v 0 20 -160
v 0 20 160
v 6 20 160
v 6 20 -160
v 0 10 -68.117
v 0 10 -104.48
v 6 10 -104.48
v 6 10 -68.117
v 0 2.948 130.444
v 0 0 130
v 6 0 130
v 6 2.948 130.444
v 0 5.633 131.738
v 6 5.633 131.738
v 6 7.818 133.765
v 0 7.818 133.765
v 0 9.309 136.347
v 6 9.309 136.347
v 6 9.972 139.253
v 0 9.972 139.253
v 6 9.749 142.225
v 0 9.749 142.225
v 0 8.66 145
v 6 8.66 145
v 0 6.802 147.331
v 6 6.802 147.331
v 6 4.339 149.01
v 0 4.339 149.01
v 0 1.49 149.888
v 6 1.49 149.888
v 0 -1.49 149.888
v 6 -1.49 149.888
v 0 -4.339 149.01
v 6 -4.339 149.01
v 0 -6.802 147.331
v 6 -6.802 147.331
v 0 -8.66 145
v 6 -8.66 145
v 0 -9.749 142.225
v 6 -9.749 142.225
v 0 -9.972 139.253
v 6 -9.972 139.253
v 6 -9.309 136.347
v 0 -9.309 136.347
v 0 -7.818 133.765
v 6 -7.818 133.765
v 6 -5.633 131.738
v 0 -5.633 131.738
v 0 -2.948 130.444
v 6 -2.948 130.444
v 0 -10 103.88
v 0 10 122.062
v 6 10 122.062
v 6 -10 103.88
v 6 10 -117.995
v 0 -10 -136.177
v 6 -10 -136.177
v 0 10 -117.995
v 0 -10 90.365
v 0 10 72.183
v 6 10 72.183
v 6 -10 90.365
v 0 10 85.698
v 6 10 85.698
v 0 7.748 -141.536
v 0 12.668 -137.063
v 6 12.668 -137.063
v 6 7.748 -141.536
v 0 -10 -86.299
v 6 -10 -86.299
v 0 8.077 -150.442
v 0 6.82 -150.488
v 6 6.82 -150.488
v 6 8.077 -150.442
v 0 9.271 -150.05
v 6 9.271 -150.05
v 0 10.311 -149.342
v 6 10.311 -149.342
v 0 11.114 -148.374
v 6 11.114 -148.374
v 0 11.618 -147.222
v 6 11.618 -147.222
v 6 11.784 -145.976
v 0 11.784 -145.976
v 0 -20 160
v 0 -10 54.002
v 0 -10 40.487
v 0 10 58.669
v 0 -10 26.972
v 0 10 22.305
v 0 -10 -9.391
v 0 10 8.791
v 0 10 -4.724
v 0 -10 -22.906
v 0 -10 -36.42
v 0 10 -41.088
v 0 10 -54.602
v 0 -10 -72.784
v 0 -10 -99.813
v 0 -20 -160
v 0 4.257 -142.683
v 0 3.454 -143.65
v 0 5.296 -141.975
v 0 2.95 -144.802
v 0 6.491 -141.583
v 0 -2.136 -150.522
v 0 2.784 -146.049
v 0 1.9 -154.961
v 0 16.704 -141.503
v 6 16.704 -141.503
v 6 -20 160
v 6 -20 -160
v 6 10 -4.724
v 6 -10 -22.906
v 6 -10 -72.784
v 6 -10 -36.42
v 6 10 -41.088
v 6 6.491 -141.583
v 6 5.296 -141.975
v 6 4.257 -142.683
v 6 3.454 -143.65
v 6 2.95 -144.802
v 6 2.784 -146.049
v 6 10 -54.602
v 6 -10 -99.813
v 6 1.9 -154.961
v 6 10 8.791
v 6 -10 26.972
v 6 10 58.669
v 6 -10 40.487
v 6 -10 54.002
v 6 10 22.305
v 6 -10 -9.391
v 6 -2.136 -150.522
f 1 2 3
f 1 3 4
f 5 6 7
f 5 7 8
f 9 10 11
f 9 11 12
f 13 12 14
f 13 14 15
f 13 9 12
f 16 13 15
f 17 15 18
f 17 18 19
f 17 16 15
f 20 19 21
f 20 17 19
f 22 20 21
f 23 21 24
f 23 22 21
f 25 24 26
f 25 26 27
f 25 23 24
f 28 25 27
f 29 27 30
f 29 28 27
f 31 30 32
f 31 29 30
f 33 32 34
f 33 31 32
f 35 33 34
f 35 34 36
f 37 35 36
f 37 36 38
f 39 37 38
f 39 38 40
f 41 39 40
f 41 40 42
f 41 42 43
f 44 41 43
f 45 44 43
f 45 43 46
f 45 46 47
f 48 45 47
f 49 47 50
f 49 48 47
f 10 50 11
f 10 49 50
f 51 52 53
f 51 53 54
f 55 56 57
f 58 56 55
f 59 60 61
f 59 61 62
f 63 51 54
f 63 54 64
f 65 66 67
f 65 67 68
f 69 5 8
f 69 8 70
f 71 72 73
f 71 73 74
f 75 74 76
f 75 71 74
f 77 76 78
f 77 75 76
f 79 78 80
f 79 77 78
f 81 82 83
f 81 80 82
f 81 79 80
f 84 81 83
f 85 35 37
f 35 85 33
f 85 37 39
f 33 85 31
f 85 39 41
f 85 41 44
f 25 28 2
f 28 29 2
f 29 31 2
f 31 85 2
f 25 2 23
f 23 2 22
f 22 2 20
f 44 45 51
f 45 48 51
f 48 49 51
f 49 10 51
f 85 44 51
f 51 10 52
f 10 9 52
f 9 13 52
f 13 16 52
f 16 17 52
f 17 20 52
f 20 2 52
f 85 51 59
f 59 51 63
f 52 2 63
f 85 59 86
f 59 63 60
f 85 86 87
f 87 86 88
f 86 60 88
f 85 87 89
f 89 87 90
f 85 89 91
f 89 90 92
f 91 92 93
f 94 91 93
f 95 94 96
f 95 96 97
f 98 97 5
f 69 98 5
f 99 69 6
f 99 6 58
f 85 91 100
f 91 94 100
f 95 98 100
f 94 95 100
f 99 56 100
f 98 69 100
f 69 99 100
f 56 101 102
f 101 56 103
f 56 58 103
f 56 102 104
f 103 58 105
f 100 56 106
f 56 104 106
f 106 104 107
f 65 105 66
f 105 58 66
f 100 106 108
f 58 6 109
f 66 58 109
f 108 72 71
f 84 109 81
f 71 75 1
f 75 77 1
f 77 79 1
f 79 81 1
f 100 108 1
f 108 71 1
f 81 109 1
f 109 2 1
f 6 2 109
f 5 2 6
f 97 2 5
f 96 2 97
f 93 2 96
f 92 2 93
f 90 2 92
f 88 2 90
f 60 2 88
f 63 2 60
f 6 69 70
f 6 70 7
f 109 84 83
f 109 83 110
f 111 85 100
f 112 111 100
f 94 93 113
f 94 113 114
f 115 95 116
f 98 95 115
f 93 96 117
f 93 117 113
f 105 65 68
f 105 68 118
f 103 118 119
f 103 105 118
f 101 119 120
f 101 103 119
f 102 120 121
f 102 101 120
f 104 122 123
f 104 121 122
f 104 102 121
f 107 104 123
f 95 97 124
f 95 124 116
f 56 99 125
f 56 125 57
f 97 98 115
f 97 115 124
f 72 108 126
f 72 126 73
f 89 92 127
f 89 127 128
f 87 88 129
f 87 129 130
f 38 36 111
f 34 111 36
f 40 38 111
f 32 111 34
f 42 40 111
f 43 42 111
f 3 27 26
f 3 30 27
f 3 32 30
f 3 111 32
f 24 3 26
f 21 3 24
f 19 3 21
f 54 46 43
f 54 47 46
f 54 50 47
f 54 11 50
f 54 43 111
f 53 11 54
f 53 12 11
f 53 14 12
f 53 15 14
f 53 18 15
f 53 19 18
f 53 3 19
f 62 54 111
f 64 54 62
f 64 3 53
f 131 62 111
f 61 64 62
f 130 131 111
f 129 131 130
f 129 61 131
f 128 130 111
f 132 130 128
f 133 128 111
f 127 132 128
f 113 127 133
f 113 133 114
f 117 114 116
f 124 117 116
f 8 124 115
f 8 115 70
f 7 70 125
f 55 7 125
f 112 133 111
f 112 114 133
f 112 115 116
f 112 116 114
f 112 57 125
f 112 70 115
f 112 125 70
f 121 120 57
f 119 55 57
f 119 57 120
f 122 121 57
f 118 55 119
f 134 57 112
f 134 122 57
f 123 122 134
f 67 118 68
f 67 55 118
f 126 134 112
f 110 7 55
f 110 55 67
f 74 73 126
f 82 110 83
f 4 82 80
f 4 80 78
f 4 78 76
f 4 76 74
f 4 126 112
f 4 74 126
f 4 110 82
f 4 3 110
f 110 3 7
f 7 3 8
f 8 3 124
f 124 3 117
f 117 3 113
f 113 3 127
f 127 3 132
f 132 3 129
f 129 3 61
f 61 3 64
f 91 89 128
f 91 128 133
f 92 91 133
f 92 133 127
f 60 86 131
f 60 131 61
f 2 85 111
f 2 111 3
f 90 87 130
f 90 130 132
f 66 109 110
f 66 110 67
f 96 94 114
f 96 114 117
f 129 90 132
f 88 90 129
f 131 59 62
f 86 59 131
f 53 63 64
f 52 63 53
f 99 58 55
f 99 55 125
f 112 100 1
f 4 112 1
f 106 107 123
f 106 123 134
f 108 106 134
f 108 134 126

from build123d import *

# Parameters (mm, degrees)
SKETCH1_W           = 320
SKETCH1_H           = 40
SKETCH1_R           = 10
BOSS_EXTRUDE1_DEPTH = 6
CUT_EXTRUDE2_DEPTH  = 10
CUT_EXTRUDE3_DEPTH  = 7


with BuildPart() as part:
    # Sketch1 → Boss-Extrude1 (new body)
    with BuildSketch(Plane(origin=(0, 0, 0), x_dir=(0, 0, -1), z_dir=(1, 0, 0))):
        Rectangle(SKETCH1_W, SKETCH1_H)
        with Locations((-140, 0)):
            Circle(SKETCH1_R, mode=Mode.SUBTRACT)
    extrude(amount=BOSS_EXTRUDE1_DEPTH)

    # Sketch2 → Cut-Extrude2 (cut)
    with BuildSketch(Plane.ZY):
        Polygon((54.001630689, -10), (72.183448871, 10), (90.365267053, -10), align=None)
        Polygon((22.305204555, 10), (58.668840919, 10), (40.487022737, -10), align=None)
        Polygon((-9.391221579, -10), (8.790596603, 10), (26.972414785, -10), align=None)
        Polygon((-4.724011349, 10), (-22.905829531, -10), (-41.087647713, 10), align=None)
        Polygon((-36.420437483, -10), (-72.784073847, -10), (-54.602255665, 10), align=None)
        Polygon((-68.116863617, 10), (-86.298681799, -10), (-104.48049998, 10), align=None)
        Polygon((-99.813289751, -10), (-136.176926114, -10), (-117.995107933, 10), align=None)
        Polygon((85.698056823, 10), (122.061693187, 10), (103.879875005, -10), align=None)
    extrude(amount=-CUT_EXTRUDE2_DEPTH, mode=Mode.SUBTRACT)

    # Sketch3 → Cut-Extrude3 (cut, through all)
    with BuildSketch(Plane.ZY):
        with BuildLine():
            Line((-146.04862835, 2.783997553), (-150.521776952, -2.136465909))
            Line((-150.521776952, -2.136465909), (-154.961417393, 1.899570855))
            Line((-154.961417393, 1.899570855), (-150.488268791, 6.820034317))
            ThreePointArc((-150.488268791, 6.820034317), (-149.34196576, 10.310877963), (-145.975842509, 11.783703228))
            Line((-145.975842509, 11.783703228), (-141.502693907, 16.70416669))
            Line((-141.502693907, 16.70416669), (-137.063053466, 12.668129926))
            Line((-137.063053466, 12.668129926), (-141.536202068, 7.747666464))
            ThreePointArc((-141.536202068, 7.747666464), (-142.682505099, 4.256822817), (-146.04862835, 2.783997553))
        make_face()
    extrude(amount=-CUT_EXTRUDE3_DEPTH, mode=Mode.SUBTRACT)


solid = part.part
